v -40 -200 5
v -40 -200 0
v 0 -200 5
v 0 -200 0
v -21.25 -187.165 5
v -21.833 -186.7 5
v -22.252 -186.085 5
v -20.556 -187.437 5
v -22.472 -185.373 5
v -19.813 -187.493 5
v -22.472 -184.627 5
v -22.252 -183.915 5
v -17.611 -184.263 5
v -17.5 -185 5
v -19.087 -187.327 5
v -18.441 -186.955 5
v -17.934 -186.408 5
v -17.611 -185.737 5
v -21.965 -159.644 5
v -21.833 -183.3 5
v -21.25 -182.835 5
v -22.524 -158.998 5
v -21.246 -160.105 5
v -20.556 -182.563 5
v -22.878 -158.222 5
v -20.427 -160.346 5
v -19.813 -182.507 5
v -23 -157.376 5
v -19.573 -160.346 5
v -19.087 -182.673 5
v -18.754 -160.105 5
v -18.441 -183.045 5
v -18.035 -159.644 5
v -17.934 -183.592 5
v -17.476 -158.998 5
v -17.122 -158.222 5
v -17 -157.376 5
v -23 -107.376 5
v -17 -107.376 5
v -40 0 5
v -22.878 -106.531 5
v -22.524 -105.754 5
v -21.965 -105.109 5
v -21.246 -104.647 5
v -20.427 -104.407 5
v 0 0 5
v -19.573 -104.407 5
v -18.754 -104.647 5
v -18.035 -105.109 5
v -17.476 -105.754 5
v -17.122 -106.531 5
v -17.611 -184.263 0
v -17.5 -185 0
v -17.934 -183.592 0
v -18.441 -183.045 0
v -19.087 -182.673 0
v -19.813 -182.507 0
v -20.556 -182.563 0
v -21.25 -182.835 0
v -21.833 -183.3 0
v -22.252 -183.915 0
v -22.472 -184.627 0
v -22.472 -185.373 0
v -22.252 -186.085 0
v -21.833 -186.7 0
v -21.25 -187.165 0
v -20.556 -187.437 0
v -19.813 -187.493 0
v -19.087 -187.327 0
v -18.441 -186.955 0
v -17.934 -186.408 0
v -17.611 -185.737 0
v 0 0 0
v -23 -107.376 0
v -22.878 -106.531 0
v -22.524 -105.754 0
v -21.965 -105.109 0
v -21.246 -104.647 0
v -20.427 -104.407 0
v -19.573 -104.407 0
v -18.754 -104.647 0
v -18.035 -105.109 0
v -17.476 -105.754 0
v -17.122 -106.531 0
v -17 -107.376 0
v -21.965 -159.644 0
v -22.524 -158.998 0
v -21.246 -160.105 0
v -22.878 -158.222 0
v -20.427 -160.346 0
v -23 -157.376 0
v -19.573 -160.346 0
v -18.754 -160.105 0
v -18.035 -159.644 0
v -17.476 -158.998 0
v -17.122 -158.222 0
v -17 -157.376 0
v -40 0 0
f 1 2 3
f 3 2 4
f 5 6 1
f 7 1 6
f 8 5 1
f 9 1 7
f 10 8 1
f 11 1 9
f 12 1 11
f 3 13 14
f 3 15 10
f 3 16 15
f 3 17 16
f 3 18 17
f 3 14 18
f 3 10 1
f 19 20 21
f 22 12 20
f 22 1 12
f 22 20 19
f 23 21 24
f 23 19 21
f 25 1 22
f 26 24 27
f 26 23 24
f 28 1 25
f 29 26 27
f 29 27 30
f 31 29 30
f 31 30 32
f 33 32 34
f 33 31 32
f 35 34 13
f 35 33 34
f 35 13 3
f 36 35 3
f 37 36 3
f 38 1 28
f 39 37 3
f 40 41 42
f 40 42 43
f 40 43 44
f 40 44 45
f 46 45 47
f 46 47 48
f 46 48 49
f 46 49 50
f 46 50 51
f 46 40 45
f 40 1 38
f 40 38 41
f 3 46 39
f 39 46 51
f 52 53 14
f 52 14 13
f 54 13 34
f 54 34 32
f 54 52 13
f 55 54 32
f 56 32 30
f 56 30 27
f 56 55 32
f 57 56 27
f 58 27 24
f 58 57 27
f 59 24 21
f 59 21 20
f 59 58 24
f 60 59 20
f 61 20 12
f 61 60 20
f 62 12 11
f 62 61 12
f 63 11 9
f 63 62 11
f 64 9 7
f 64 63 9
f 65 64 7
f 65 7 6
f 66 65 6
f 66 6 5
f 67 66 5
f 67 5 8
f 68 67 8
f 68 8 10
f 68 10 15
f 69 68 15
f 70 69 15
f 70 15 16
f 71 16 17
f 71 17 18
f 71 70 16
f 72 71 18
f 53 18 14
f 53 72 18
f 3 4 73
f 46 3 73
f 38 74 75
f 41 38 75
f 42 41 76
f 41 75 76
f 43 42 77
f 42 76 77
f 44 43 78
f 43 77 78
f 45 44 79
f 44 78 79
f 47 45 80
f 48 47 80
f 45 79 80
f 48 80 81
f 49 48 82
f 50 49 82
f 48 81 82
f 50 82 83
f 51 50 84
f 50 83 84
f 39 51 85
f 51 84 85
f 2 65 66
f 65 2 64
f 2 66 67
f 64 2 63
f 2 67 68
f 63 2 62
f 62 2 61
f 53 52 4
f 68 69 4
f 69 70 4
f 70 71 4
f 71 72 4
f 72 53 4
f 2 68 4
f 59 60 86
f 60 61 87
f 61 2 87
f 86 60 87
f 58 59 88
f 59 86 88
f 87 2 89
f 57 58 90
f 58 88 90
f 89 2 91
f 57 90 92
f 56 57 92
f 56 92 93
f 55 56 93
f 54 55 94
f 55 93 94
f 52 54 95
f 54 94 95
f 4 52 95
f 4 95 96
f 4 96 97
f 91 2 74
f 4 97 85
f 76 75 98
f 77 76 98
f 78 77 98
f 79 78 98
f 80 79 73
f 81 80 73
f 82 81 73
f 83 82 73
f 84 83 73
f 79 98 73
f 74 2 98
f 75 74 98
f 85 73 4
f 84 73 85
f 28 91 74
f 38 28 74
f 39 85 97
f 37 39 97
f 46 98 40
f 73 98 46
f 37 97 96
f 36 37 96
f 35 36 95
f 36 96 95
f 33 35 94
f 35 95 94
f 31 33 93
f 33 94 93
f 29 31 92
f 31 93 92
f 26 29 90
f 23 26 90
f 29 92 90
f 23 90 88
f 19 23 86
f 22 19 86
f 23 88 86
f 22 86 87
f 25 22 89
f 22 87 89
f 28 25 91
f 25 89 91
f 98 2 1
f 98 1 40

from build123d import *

# Parameters (mm, degrees)
SKETCH1_W           = 40
SKETCH1_H           = 200
SKETCH1_R           = 2.5
BOSS_EXTRUDE1_DEPTH = 5


with BuildPart() as part:
    # Sketch1 → Boss-Extrude1 (new body)
    with BuildSketch(Plane.XY):
        with Locations((-20, -100)):
            Rectangle(SKETCH1_W, SKETCH1_H)
        with Locations((-20, -185)):
            Circle(SKETCH1_R, mode=Mode.SUBTRACT)
        with BuildLine():
            Line((-17, -107.376368338), (-17, -157.376368338))
            ThreePointArc((-17, -157.376368338), (-20, -160.376368338), (-23, -157.376368338))
            Line((-23, -157.376368338), (-23, -107.376368338))
            ThreePointArc((-23, -107.376368338), (-20, -104.376368338), (-17, -107.376368338))
        make_face(mode=Mode.SUBTRACT)
    extrude(amount=BOSS_EXTRUDE1_DEPTH)


solid = part.part
